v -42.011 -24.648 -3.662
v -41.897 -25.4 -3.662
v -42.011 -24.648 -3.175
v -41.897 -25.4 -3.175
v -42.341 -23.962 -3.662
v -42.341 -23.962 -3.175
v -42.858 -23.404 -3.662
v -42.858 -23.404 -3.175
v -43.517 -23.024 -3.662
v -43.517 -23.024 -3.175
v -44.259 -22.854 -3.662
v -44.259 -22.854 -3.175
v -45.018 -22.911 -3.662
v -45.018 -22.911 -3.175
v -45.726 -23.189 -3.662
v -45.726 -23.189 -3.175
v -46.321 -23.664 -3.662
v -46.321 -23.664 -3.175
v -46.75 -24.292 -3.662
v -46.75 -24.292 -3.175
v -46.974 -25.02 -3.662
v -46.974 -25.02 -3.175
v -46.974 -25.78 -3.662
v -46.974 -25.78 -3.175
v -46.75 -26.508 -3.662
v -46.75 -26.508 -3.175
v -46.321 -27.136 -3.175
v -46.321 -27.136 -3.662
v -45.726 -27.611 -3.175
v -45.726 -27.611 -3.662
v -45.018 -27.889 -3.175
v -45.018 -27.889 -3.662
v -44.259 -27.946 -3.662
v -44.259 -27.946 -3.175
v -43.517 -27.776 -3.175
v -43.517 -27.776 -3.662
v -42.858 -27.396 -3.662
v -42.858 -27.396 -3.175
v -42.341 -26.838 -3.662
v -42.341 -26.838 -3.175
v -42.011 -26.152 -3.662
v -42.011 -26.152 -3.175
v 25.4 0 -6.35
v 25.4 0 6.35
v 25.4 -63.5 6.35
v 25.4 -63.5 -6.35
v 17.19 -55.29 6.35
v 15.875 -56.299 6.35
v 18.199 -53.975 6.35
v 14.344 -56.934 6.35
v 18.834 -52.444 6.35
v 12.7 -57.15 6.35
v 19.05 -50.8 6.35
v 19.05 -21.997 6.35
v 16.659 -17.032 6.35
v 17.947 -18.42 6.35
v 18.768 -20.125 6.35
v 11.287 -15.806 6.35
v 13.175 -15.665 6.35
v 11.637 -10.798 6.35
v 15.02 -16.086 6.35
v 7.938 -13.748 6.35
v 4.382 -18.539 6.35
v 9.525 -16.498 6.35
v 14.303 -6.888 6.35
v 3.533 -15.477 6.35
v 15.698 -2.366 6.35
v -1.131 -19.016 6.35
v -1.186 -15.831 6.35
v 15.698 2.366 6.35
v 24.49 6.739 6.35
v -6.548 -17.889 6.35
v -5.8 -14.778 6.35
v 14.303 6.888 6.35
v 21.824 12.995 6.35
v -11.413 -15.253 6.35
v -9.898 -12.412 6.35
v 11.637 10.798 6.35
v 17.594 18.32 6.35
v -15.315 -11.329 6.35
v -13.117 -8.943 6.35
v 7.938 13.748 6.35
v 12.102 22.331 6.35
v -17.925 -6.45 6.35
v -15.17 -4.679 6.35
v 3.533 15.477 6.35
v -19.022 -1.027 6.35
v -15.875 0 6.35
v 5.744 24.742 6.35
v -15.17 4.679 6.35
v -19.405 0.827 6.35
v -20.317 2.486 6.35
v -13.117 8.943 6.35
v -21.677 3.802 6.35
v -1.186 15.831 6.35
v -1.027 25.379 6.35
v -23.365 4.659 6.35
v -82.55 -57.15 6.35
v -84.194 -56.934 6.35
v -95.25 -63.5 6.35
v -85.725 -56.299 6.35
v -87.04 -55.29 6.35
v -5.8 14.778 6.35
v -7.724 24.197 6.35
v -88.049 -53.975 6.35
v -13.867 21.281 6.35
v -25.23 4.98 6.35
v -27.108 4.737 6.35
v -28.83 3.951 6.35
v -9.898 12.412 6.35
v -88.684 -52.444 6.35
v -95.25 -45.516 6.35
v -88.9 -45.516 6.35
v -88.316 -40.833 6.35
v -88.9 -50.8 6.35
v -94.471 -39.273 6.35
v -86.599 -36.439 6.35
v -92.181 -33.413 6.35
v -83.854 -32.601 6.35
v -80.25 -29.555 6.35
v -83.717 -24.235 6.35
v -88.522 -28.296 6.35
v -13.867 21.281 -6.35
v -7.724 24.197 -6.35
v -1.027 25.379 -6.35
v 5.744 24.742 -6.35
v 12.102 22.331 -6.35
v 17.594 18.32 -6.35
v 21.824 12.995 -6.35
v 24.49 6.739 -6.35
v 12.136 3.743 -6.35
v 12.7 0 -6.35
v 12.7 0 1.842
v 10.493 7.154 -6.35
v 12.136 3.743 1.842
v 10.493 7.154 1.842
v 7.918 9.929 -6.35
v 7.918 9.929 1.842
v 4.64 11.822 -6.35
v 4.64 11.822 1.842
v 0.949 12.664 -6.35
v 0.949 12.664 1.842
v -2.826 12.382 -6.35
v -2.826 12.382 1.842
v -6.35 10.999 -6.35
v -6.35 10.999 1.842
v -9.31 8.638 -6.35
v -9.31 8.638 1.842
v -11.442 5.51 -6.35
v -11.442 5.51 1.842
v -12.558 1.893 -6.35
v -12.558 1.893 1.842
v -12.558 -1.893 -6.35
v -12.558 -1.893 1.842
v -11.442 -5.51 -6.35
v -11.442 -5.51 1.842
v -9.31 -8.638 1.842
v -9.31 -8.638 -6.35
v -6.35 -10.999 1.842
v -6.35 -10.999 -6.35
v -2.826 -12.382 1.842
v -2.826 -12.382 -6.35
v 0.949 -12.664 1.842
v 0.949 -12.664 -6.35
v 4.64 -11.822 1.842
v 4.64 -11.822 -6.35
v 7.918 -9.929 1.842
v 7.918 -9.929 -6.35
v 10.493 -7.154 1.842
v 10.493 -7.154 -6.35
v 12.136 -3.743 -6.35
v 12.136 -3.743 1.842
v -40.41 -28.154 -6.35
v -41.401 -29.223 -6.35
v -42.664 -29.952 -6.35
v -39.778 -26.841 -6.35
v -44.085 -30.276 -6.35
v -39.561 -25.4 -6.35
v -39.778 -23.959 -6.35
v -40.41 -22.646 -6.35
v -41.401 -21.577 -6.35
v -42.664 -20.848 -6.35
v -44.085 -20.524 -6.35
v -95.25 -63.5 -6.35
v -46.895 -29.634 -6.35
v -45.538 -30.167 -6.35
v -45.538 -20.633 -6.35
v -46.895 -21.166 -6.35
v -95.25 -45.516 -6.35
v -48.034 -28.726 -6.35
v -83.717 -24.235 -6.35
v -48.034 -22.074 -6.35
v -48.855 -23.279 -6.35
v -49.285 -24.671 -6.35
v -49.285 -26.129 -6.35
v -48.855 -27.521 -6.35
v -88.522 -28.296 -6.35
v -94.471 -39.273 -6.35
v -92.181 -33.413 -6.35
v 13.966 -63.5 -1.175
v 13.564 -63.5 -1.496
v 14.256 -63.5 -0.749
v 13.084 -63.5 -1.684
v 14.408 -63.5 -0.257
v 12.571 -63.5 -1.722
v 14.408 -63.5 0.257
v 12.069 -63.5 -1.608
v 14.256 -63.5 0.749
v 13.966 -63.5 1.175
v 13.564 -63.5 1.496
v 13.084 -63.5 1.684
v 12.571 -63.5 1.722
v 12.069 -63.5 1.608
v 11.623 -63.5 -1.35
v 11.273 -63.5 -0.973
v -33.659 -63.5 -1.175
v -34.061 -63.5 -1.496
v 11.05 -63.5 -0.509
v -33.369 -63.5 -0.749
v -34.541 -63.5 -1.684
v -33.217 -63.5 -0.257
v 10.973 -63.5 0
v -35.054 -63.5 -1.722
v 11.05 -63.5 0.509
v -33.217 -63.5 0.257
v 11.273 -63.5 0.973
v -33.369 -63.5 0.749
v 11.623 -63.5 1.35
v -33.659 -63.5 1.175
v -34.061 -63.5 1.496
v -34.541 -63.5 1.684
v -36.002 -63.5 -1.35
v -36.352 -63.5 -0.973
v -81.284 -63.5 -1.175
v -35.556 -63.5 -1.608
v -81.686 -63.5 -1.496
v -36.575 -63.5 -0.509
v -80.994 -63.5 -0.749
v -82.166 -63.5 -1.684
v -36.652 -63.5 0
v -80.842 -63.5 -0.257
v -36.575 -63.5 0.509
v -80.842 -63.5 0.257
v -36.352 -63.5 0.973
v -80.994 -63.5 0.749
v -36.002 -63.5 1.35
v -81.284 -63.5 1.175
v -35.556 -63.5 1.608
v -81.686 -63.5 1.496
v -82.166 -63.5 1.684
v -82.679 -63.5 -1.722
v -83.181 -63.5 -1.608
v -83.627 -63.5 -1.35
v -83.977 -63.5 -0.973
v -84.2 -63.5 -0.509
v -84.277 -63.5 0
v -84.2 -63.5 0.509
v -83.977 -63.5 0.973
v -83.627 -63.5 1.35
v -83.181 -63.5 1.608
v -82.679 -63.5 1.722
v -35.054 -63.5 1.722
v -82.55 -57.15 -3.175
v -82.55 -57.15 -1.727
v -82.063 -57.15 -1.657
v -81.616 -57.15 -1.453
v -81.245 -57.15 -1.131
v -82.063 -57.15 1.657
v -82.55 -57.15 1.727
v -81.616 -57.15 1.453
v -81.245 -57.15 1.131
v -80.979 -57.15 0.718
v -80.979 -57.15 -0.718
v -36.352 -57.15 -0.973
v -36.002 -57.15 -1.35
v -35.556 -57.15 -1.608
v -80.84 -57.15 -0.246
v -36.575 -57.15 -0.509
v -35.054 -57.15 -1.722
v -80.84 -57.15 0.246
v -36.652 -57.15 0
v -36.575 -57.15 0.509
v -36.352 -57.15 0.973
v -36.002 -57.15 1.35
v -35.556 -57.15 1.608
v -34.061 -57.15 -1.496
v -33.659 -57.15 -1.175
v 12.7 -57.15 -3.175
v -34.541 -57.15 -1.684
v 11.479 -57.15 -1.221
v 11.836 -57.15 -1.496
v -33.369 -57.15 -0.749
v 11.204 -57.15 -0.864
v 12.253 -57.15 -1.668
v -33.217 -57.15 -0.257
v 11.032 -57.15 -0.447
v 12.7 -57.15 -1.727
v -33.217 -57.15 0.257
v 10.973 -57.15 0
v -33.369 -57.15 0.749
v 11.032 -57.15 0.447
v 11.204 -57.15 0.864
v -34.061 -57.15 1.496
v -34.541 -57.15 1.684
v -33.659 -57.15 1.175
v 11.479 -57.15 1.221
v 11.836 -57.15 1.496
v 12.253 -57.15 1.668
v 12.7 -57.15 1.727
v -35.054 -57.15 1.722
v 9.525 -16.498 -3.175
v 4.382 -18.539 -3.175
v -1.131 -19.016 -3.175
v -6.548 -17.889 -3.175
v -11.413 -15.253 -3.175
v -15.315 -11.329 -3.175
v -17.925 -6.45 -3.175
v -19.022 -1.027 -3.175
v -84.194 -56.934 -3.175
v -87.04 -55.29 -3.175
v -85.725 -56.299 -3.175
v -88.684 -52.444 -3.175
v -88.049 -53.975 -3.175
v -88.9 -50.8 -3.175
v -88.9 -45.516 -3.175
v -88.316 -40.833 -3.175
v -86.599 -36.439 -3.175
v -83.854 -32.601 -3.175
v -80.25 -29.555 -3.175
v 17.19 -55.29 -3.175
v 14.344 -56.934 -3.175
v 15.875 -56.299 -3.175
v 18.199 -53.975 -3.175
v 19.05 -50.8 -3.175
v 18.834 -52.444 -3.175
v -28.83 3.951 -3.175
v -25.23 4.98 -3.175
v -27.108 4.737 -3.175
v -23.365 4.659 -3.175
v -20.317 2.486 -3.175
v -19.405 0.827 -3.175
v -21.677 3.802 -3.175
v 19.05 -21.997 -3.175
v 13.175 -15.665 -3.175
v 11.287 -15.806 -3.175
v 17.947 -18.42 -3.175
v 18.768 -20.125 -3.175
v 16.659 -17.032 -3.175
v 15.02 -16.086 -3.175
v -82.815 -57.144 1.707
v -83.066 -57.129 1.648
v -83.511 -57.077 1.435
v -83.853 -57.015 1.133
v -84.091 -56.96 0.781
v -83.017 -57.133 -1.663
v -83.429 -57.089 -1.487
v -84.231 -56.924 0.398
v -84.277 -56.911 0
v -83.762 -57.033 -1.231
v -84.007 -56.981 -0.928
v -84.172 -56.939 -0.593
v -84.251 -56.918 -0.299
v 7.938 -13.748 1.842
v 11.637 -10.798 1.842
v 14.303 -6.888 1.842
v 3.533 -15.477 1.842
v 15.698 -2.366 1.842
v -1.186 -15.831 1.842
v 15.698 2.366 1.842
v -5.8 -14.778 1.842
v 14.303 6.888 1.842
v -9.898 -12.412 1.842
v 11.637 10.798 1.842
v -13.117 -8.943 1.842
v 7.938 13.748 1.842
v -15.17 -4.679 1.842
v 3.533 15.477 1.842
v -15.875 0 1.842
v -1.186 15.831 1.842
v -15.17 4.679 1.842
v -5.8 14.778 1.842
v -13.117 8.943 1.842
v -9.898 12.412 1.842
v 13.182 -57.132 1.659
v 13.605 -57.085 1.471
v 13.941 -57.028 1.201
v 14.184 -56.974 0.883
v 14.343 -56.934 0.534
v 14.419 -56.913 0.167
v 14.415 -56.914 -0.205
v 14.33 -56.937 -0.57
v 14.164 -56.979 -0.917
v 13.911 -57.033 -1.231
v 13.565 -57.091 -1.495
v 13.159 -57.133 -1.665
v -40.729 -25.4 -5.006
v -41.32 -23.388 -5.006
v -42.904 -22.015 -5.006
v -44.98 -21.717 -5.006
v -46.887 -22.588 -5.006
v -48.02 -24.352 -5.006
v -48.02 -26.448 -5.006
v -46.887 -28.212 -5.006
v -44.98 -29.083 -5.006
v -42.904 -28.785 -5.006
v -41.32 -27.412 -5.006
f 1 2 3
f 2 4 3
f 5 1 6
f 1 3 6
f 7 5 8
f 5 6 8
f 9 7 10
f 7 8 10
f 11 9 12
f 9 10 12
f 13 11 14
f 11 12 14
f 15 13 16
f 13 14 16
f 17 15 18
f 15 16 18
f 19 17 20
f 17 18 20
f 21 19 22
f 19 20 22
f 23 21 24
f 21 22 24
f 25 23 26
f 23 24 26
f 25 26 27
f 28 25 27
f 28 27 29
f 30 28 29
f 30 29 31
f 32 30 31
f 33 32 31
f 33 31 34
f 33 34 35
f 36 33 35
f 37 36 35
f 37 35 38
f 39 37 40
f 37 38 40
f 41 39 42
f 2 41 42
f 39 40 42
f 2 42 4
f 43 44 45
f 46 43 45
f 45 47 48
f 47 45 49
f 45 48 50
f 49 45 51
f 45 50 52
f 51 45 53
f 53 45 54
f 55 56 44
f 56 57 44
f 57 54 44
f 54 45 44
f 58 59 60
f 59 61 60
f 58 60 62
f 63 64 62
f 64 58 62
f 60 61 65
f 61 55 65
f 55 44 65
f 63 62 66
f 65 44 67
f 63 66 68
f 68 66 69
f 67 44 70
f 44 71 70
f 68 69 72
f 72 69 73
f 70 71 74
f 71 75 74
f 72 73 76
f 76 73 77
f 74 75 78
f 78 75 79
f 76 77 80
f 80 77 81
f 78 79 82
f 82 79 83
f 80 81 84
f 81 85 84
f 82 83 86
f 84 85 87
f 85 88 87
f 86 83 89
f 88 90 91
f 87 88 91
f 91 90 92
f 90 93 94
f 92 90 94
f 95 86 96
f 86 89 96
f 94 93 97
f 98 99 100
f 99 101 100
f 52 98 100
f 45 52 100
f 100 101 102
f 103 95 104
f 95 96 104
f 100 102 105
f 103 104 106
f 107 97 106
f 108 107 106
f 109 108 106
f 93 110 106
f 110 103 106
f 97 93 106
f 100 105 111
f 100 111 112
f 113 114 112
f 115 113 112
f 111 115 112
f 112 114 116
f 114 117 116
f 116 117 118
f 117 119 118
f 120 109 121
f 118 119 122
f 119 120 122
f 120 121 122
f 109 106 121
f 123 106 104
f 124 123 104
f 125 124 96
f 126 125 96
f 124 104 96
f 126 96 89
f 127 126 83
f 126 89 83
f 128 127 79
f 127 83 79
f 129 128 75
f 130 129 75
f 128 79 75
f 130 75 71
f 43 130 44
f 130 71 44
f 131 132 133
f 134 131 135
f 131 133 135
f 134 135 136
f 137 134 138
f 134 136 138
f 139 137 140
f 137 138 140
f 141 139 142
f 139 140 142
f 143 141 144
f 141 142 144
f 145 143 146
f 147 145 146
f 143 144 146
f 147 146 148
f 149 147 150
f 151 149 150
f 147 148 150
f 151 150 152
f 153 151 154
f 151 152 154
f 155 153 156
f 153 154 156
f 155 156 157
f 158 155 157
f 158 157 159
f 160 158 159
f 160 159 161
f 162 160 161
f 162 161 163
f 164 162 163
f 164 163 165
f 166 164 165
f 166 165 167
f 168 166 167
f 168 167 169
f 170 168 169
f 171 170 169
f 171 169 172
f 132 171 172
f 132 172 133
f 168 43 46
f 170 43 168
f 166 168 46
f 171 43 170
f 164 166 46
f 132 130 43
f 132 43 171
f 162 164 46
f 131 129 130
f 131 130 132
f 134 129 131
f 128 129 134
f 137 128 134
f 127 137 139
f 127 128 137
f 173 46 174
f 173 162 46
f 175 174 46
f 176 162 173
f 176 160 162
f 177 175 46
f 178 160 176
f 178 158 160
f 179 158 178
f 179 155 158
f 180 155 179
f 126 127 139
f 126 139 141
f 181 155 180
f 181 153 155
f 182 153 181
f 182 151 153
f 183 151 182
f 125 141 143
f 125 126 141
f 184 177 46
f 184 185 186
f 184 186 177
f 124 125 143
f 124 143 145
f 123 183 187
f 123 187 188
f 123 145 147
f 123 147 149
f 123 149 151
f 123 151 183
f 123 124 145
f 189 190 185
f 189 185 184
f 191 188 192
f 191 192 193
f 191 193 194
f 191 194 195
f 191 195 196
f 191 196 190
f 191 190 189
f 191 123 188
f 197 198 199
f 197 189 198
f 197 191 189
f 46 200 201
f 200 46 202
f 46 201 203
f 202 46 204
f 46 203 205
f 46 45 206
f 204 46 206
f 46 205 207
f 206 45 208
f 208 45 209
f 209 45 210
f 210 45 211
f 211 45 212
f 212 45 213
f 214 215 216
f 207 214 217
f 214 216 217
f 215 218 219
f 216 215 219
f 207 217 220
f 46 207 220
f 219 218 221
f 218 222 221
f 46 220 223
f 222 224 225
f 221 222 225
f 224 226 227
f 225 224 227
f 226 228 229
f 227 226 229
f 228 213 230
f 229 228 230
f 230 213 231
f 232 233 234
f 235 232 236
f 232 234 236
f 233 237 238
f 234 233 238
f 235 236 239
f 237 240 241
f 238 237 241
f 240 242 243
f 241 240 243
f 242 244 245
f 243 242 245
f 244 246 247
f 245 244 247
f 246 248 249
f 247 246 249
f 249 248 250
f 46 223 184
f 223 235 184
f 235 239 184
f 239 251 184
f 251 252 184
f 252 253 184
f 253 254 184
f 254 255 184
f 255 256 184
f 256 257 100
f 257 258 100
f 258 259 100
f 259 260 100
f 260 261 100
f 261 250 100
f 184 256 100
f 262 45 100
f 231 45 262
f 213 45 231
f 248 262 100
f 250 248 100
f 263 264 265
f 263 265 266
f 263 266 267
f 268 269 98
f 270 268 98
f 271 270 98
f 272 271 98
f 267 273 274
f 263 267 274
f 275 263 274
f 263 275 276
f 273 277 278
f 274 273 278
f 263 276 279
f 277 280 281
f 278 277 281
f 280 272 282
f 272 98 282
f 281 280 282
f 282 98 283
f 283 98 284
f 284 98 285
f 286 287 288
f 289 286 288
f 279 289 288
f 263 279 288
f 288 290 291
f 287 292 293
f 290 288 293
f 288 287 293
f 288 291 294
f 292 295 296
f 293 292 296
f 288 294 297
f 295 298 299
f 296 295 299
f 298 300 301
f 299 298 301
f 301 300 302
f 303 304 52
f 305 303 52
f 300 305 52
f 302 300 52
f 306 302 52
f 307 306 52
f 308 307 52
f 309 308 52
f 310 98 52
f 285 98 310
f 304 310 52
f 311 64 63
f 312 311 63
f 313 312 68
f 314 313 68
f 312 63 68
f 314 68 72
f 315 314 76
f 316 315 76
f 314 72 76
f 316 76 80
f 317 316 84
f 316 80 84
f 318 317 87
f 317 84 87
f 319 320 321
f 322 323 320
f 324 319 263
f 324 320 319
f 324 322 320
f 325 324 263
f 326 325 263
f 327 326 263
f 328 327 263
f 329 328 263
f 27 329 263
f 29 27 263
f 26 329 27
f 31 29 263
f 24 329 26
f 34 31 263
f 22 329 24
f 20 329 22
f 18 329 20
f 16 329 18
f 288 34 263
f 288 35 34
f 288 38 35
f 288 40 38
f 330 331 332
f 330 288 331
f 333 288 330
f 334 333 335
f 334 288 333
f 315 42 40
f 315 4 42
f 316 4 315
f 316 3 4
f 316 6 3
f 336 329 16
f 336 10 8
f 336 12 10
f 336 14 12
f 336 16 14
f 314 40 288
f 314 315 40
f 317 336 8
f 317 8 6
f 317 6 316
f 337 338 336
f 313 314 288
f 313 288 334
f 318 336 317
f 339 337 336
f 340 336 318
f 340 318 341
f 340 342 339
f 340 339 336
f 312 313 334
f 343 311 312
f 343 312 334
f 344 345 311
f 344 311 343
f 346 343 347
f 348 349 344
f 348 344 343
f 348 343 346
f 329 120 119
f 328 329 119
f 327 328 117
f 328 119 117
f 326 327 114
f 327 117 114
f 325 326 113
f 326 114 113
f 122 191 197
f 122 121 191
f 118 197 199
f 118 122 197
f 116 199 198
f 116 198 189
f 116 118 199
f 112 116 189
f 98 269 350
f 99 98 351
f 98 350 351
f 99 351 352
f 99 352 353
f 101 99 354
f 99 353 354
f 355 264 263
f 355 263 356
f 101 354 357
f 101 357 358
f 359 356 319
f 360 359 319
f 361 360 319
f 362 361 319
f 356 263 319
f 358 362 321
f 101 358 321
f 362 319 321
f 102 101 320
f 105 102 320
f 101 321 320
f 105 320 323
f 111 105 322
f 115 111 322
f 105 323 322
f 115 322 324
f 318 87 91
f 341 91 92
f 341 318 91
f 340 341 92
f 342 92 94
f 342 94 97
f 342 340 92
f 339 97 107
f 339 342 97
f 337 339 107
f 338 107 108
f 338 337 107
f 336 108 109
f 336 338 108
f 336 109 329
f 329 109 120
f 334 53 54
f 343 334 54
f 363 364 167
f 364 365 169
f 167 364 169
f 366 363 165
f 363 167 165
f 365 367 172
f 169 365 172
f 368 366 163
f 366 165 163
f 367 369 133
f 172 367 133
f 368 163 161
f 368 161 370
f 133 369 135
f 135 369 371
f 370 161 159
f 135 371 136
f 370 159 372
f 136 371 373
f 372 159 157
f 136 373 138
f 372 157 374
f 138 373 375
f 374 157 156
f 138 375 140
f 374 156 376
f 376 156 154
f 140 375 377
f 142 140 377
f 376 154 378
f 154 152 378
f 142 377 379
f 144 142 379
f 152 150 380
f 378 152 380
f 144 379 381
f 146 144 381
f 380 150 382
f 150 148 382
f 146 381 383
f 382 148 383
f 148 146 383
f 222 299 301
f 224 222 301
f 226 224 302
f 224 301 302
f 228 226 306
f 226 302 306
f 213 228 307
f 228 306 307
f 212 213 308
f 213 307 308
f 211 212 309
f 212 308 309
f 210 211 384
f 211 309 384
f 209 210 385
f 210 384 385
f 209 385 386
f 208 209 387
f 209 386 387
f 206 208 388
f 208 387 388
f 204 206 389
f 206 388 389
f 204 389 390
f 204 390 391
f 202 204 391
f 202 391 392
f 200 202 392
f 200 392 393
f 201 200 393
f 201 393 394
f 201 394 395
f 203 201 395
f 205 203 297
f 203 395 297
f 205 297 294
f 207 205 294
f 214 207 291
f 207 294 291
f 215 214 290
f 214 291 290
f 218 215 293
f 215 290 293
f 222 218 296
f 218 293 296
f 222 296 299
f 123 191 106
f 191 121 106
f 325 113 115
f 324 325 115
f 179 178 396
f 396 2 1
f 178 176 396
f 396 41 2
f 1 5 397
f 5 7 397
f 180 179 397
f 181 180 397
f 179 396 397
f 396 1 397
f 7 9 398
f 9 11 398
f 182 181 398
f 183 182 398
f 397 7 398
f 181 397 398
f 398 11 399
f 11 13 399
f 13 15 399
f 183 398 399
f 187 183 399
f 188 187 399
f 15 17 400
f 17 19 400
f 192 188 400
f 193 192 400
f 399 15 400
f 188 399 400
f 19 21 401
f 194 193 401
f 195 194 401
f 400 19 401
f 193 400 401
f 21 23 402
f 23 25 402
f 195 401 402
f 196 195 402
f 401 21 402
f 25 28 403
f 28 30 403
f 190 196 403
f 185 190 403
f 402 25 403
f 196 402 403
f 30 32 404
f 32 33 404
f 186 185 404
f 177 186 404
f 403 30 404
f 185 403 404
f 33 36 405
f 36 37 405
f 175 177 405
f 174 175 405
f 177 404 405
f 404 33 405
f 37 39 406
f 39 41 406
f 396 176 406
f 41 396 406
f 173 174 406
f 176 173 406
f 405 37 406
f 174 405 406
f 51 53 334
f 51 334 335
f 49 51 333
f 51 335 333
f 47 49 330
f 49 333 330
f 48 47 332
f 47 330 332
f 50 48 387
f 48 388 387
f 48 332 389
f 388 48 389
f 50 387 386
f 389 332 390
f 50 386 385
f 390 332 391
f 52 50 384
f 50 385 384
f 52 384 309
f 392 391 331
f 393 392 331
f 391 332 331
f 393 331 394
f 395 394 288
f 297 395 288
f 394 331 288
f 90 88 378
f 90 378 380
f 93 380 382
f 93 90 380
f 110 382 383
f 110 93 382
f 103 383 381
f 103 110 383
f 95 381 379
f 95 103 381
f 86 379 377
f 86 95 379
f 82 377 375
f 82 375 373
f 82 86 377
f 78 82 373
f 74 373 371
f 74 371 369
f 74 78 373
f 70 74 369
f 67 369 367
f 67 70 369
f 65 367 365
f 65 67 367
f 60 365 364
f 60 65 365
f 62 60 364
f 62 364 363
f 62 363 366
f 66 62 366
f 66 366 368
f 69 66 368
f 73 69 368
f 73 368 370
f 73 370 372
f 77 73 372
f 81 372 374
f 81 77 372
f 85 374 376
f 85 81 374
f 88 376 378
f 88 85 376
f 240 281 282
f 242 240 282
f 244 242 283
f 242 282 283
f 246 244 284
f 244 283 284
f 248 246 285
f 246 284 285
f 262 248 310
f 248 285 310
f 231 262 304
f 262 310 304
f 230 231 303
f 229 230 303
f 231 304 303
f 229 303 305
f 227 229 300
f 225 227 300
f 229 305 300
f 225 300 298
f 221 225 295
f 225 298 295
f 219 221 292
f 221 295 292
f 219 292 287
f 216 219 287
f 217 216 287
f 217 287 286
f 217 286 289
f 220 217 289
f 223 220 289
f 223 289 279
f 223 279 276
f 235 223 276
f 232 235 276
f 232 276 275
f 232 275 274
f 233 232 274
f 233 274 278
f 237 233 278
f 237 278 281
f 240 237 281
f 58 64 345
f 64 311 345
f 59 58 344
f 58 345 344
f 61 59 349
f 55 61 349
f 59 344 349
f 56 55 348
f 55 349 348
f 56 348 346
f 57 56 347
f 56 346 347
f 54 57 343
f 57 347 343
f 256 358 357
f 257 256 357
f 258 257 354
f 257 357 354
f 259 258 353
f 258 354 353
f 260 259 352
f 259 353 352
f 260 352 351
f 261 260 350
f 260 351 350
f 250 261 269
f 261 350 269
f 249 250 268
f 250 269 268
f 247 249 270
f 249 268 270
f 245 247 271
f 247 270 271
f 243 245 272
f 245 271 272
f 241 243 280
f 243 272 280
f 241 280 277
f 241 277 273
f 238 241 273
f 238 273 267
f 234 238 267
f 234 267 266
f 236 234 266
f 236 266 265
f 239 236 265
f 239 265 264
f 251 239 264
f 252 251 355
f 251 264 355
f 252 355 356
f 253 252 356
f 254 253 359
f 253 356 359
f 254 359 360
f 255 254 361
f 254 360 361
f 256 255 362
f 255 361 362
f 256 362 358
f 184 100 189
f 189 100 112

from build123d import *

# Parameters (mm, degrees)
BOSS_EXTRUDE1_DEPTH                             = 6.35
SKETCH4_R                                       = 12.7
CUT_EXTRUDE3_DEPTH                              = 116.178567885
SKETCH5_R                                       = 15.875
CUT_EXTRUDE4_DEPTH                              = 4.5085
FILLET1_R                                       = 25.4
CUT_EXTRUDE5_DEPTH                              = 9.525
FILLET2_R                                       = 6.35
F_8_32_TAPPED_HOLE1_D                           = 3.4544
F_8_32_TAPPED_HOLE1_DEPTH                       = 10.668
F_8_32_TAPPED_HOLE1_TIP                         = 1.037806461
CSK_FOR_10_FLAT_HEAD_MACHINE_SCREW1_D           = 5.1054
CSK_FOR_10_FLAT_HEAD_MACHINE_SCREW1_CSINK_D     = 9.779
CSK_FOR_10_FLAT_HEAD_MACHINE_SCREW1_CSINK_ANGLE = 82


with BuildPart() as part:
    # Sketch1 → Boss-Extrude1 (new, symmetric)
    with BuildSketch(Plane.XY):
        with BuildLine():
            Line((25.4, 0), (25.4, -63.5))
            Line((25.4, -63.5), (-95.25, -63.5))
            Line((-95.25, -63.5), (-95.25, -31.75))
            Line((-95.25, -31.75), (-13.866905739, 21.280717216))
            ThreePointArc((-13.866905739, 21.280717216), (12.10249136, 22.33136142), (25.4, 0))
        make_face()
    extrude(amount=BOSS_EXTRUDE1_DEPTH, both=True)

    # Sketch4 → Cut-Extrude3 (cut, through all)
    with BuildSketch(Plane.XY.offset(6.35)):
        Circle(SKETCH4_R)
    extrude(amount=-CUT_EXTRUDE3_DEPTH, mode=Mode.SUBTRACT)

    # Sketch5 → Cut-Extrude4 (cut)
    with BuildSketch(Plane(origin=(0, 0, 6.35), x_dir=(-1, 0, 0), z_dir=(0, 0, -1))):
        Circle(SKETCH5_R)
    extrude(amount=CUT_EXTRUDE4_DEPTH, mode=Mode.SUBTRACT)

    # Fillet1
    fillet1_edges = [part.edges().sort_by_distance(p)[0] for p in [
        (-95.25, -31.75, 0),
    ]]
    fillet(fillet1_edges, radius=FILLET1_R)

    # Sketch9 → Cut-Extrude5 (cut)
    with BuildSketch(Plane.XY.offset(6.35)):
        with BuildLine():
            Line((-10.400179304, 15.960537912), (-80.250179304, -29.555003506))
            ThreePointArc((-80.250179304, -29.555003506), (-86.598521065, -36.438672898), (-88.9, -45.515541418))
            Line((-88.9, -45.515541418), (-88.9, -57.15))
            Line((-88.9, -57.15), (19.05, -57.15))
            Line((19.05, -57.15), (19.05, 0))
            ThreePointArc((19.05, 0), (-9.07686852, -16.748521065), (-10.400179304, 15.960537912))
        make_face()
    extrude(amount=-CUT_EXTRUDE5_DEPTH, mode=Mode.SUBTRACT)

    # Fillet2
    fillet2_edges = [part.edges().sort_by_distance(p)[0] for p in [
        (-10.400179304, 15.960537912, 1.5875),
        (19.05, 0, 1.5875),
        (19.05, -57.15, 1.5875),
        (-88.9, -57.15, 1.5875),
    ]]
    fillet(fillet2_edges, radius=FILLET2_R)

    # #8-32 Tapped Hole1
    with Locations(Plane.XZ.offset(63.5)):
        with Locations((-82.55, 0), (-34.925, 0), (12.7, 0)):
            Hole(F_8_32_TAPPED_HOLE1_D / 2, depth=F_8_32_TAPPED_HOLE1_DEPTH)
            with Locations((0, 0, -(F_8_32_TAPPED_HOLE1_DEPTH + F_8_32_TAPPED_HOLE1_TIP / 2))):  # 118° drill point
                Cone(0, F_8_32_TAPPED_HOLE1_D / 2, F_8_32_TAPPED_HOLE1_TIP, mode=Mode.SUBTRACT)

    # CSK for #10 Flat Head Machine Screw1 (through all)
    with Locations(Plane(origin=(0, 0, -6.35), x_dir=(-1, 0, 0), z_dir=(0, 0, -1))):
        with Locations((44.45, -25.4)):
            CounterSinkHole(CSK_FOR_10_FLAT_HEAD_MACHINE_SCREW1_D / 2, CSK_FOR_10_FLAT_HEAD_MACHINE_SCREW1_CSINK_D / 2, counter_sink_angle=CSK_FOR_10_FLAT_HEAD_MACHINE_SCREW1_CSINK_ANGLE)


solid = part.part
